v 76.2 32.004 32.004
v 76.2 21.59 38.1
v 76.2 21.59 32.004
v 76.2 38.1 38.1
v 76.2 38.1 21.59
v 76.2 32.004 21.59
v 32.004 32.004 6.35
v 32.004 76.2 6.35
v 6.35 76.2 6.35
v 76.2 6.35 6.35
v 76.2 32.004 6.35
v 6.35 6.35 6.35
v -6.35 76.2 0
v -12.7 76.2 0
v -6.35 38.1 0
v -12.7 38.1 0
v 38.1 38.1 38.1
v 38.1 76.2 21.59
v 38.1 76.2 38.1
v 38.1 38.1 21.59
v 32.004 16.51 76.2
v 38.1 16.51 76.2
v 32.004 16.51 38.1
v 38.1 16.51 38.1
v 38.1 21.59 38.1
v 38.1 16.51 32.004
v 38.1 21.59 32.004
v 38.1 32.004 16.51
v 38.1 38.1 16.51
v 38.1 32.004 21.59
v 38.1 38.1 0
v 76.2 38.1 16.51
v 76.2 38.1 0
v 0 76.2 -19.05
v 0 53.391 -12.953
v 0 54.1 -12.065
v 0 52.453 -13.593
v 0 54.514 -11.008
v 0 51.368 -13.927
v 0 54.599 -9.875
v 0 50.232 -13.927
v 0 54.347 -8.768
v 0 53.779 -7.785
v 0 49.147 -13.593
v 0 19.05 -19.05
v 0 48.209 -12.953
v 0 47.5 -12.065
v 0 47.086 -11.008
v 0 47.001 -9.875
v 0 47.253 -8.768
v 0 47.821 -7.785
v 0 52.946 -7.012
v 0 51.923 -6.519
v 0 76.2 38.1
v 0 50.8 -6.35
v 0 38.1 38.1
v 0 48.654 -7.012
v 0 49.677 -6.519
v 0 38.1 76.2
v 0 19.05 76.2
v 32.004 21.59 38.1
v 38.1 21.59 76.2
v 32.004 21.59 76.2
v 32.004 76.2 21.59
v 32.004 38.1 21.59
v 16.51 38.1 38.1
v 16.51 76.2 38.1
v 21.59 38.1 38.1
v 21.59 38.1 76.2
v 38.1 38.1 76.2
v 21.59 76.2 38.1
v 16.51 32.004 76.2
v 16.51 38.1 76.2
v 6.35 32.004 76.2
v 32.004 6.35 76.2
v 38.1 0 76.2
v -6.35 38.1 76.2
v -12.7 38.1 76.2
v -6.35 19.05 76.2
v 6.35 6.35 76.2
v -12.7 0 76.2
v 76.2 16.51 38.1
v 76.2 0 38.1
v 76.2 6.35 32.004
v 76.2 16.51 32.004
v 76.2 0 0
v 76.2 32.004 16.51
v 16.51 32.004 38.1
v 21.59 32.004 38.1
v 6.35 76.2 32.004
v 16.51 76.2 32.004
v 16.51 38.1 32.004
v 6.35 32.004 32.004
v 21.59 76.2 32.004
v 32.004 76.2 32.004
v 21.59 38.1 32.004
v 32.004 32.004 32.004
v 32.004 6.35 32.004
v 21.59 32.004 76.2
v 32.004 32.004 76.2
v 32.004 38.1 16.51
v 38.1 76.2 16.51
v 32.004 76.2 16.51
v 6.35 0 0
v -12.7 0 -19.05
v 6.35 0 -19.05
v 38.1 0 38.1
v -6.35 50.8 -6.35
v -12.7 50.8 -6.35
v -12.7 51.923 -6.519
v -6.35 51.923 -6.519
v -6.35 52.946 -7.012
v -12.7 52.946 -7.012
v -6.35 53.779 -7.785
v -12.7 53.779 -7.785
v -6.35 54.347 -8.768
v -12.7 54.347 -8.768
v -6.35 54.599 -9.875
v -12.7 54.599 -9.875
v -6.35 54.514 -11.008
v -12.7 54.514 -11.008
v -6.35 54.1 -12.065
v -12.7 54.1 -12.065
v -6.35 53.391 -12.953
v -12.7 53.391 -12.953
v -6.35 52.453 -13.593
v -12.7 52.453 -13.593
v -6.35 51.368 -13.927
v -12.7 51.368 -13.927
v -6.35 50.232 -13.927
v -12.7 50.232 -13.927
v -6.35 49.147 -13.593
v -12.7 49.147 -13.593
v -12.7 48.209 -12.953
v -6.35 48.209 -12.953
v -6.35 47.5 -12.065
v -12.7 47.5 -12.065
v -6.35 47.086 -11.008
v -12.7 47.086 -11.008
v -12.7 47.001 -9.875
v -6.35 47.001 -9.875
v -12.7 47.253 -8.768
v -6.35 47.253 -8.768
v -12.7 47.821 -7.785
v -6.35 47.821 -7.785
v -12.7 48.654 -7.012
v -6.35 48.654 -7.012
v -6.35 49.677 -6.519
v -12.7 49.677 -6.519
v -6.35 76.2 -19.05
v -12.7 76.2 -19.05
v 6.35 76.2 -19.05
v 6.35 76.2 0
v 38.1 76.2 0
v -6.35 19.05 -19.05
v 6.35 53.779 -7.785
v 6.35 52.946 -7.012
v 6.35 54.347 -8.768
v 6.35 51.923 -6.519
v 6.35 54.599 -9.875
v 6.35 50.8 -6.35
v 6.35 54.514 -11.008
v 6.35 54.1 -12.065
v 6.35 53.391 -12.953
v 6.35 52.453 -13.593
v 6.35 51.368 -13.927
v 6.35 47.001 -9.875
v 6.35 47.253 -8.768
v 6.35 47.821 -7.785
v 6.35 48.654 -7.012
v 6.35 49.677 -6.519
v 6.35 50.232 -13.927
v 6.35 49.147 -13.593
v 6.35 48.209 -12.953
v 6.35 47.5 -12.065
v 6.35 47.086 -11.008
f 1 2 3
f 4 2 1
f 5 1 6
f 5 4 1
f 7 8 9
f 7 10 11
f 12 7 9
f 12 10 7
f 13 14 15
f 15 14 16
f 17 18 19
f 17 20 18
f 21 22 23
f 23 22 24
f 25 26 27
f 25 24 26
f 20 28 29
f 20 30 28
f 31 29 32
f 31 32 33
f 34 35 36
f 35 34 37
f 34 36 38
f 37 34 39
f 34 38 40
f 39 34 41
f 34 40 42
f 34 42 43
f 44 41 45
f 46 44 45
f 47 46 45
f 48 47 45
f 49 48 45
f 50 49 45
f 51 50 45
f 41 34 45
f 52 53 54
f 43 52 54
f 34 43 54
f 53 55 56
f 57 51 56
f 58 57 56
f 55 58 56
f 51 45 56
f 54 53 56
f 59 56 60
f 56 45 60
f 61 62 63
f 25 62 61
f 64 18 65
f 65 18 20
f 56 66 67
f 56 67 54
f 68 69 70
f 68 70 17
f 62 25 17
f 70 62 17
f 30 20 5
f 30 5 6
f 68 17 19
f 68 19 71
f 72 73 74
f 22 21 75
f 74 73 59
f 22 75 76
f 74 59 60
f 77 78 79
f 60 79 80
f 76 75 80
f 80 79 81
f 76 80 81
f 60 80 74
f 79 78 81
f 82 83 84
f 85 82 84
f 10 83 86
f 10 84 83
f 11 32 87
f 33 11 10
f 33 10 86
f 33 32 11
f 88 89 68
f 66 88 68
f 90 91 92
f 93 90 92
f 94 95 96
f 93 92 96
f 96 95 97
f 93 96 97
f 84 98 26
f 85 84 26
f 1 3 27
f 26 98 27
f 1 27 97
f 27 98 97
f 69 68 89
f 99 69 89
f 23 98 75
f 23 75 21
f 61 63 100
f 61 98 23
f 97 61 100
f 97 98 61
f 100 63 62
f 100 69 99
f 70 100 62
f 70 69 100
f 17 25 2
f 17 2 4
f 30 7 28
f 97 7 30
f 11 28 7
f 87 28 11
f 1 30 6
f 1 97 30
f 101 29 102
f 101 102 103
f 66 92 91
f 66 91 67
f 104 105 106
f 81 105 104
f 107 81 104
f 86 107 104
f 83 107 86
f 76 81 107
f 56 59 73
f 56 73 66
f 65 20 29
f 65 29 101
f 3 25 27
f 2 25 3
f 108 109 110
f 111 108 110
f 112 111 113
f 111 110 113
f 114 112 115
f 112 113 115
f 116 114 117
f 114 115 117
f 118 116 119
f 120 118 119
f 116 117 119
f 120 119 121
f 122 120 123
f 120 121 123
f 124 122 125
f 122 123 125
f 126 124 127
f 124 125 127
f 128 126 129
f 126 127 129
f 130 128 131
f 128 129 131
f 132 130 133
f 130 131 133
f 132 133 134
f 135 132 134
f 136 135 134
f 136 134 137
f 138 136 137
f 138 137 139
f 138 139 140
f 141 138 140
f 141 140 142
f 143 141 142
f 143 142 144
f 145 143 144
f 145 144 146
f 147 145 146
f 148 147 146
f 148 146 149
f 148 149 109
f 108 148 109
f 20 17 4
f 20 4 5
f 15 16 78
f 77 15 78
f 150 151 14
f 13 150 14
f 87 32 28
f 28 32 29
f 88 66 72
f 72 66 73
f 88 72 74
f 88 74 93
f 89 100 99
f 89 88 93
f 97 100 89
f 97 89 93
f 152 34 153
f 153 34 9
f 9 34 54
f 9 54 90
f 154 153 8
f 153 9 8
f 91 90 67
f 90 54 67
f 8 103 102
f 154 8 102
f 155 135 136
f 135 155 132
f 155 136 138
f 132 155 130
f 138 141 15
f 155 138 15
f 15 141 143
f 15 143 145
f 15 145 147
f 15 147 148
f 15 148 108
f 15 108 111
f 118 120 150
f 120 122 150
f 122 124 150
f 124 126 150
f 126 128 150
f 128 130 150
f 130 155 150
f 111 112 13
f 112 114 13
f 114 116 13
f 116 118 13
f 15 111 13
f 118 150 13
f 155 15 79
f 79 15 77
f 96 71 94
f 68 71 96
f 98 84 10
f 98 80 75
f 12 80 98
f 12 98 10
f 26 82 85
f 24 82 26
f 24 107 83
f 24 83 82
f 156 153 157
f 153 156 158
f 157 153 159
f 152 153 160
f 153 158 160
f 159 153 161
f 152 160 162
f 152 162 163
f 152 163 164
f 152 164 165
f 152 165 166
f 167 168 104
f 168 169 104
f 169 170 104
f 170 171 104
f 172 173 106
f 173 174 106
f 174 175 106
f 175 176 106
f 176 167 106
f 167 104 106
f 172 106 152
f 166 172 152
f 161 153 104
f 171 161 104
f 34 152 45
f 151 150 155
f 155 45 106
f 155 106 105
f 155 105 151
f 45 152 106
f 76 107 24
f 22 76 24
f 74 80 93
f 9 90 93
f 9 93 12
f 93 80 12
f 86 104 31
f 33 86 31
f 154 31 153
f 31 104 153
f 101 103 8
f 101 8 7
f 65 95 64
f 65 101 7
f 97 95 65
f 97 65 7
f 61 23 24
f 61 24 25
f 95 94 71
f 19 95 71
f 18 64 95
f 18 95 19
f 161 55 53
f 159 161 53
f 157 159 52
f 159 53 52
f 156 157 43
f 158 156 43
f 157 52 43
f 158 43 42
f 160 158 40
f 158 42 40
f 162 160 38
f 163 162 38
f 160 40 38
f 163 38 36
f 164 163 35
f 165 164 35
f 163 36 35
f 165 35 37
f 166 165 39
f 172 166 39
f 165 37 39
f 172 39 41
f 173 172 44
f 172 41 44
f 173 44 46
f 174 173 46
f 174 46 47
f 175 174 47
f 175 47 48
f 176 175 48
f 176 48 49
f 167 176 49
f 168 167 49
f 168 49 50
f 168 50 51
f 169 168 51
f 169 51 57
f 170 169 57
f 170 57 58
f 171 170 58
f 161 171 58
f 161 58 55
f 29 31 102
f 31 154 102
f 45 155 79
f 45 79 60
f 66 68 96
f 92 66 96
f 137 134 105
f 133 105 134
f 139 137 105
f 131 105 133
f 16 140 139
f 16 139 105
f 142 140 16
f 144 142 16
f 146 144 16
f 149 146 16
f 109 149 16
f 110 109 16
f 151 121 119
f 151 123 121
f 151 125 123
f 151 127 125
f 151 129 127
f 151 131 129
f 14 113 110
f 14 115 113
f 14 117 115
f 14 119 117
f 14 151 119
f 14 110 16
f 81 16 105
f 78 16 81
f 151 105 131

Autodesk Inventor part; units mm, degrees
ref_plane "YZ Plane" through (0, 0, 0) normal (1, 0, 0) x (0, 1, 0)
ref_plane "XZ Plane" through (0, 0, 0) normal (0, 1, 0) x (-1, 0, 0)
ref_plane "XY Plane" through (0, 0, 0) normal (0, 0, 1) x (1, 0, 0)
sketch "Sketch1" plane through (0, 0, 0) normal (0, 0, 1) x (1, 0, 0)
  line L0 (0, 0) -> (38.1, 0)
  line L1 (38.1, 0) -> (38.1, 38.1)
  line L2 (38.1, 38.1) -> (0, 38.1)
  line L3 (0, 38.1) -> (0, 0)
  dimension "d0" = 38.1
  dimension "d1" = 38.1
extrude "Extrusion1" add sketch "Sketch1" along normal blind 38.1
sketch "Sketch2" plane through (0, 0, 38.1) normal (0, 0, 1) x (1, 0, 0)
  line L0 (6.35, 6.35) -> (32.004, 6.35)
  line L1 (32.004, 6.35) -> (32.004, 32.004)
  line L2 (32.004, 32.004) -> (6.35, 32.004)
  line L3 (6.35, 32.004) -> (6.35, 6.35)
  line L4 (38.1, 0) -> (38.1, 38.1) projected
  line L5 (0, 0) -> (38.1, 0)
  line L6 (38.1, 0) -> (38.1, 38.1)
  line L7 (38.1, 38.1) -> (0, 38.1)
  line L8 (0, 38.1) -> (0, 0)
  dimension "d4" = 25.654
  dimension "d5" = 25.654
extrude "Extrusion2" cut sketch "Sketch2" against normal blind 31.75 contours L3 L2 L1 L0
sketch "Sketch5" plane through (0, 0, 38.1) normal (0, 0, 1) x (1, 0, 0)
  line L0 (6.35, 6.35) -> (6.35, 32.004) projected
  line L1 (6.35, 6.35) -> (32.004, 6.35)
  line L2 (32.004, 6.35) -> (32.004, 32.004)
  line L3 (32.004, 32.004) -> (6.35, 32.004)
  line L4 (6.35, 32.004) -> (6.35, 6.35)
  line L5 (0, 0) -> (38.1, 0) projected
  line L6 (0, 0) -> (38.1, 0)
  line L7 (38.1, 0) -> (38.1, 38.1)
  line L8 (38.1, 38.1) -> (0, 38.1)
  line L9 (0, 38.1) -> (0, 0)
extrude "Extrusion4" add sketch "Sketch5" along normal blind 38.1
sketch "Sketch7" plane through (38.1, 0, 0) normal (1, 0, 0) x (0, 0, -1)
  line L0 (0, 0) -> (-76.2, 0) projected
  line L1 (0, 0) -> (-38.1, 0)
  line L2 (-38.1, 0) -> (-38.1, 38.1)
  line L3 (-38.1, 38.1) -> (0, 38.1)
  line L4 (0, 38.1) -> (0, 0)
  line L5 (-76.2, 6.35) -> (-6.35, 6.35) projected
  line L6 (-6.35, 6.35) -> (-32.004, 6.35)
  line L7 (-32.004, 6.35) -> (-32.004, 32.004)
  line L8 (-32.004, 32.004) -> (-6.35, 32.004)
  line L9 (-6.35, 32.004) -> (-6.35, 6.35)
  dimension "d16" = 38.1
  dimension "d17" = 38.1
  dimension "d20" = 25.654
  dimension "d21" = 25.654
extrude "Extrusion6" add sketch "Sketch7" along normal blind 38.1
sketch "Sketch9" plane through (38.1, 6.35, 6.35) normal (1, 0, 0) x (0, 0, -1)
  line L0 (-25.654, 0) -> (-25.654, 25.654) projected
  line L1 (0, 0) -> (0, 25.654) projected
  line L2 (-25.654, 0) -> (0, 0)
  line L3 (0, 0) -> (0, 25.654)
  line L4 (0, 25.654) -> (-25.654, 25.654)
  line L5 (-25.654, 25.654) -> (-25.654, 0)
  point P0 (6.35, -6.35)
extrude "Extrusion7" cut sketch "Sketch9" against normal blind 31.75
sketch "Sketch10" plane through (0, 38.1, 76.2) normal (0, 1, 0) x (1, 0, 0)
  line L0 (76.2, 69.85) -> (6.35, 69.85) projected
  line L1 (6.35, 69.85) -> (32.004, 69.85)
  line L2 (32.004, 69.85) -> (32.004, 44.196)
  line L3 (32.004, 44.196) -> (6.35, 44.196)
  line L4 (6.35, 44.196) -> (6.35, 69.85)
  line L5 (38.1, 38.1) -> (38.1, 0) projected
  line L6 (0, 76.2) -> (0, 0) projected
  line L7 (38.1, 38.1) -> (0, 38.1)
  line L8 (0, 38.1) -> (0, 76.2)
  line L9 (0, 76.2) -> (38.1, 76.2)
  line L10 (38.1, 76.2) -> (38.1, 38.1)
  point P0 (0, 38.1)
  dimension "d26" = 25.654
  dimension "d27" = 25.654
extrude "Extrusion8" add sketch "Sketch10" along normal blind 38.1
sketch "Sketch11" plane through (6.35, 38.1, 6.35) normal (0, 1, 0) x (1, 0, 0)
  line L0 (0, -25.654) -> (25.654, -25.654) projected
  line L1 (25.654, -25.654) -> (0, -25.654)
  line L2 (0, -25.654) -> (0, 0)
  line L3 (0, 0) -> (25.654, 0)
  line L4 (25.654, 0) -> (25.654, -25.654)
  point P0 (-6.35, 6.35)
extrude "Extrusion9" cut sketch "Sketch11" against normal blind 6.35
sketch "Sketch12" plane through (0, 76.2, 76.2) normal (0, 1, 0) x (1, 0, 0)
  line L0 (38.1, 55.88) -> (32.004, 55.88)
  line L1 (32.004, 55.88) -> (32.004, 58.42)
  line L2 (32.004, 58.42) -> (38.1, 58.42)
  line L3 (38.1, 58.42) -> (38.1, 55.88)
  point P0 (0, 76.2)
  dimension "d32" = 6.096
  dimension "d33" = 2.54
extrude "Extrusion10" cut sketch "Sketch12" against normal blind 38.1
sketch "Sketch13" plane through (76.2, 38.1, 38.1) normal (0, 1, 0) x (1, 0, 0)
  line L0 (0, 31.75) -> (0, 6.096) projected
  line L1 (-44.196, 17.78) -> (0, 17.78)
  line L2 (0, 17.78) -> (0, 20.32)
  line L3 (0, 20.32) -> (-44.196, 20.32)
  line L4 (-44.196, 20.32) -> (-44.196, 17.78)
  point P0 (-76.2, 38.1)
  dimension "d36" = 2.54
extrude "Extrusion11" cut sketch "Sketch13" against normal blind 6.35
sketch "Sketch15" plane through (0, 76.2, 76.2) normal (0, 1, 0) x (1, 0, 0)
  line L0 (17.78, 38.1) -> (20.32, 38.1)
  line L1 (20.32, 38.1) -> (20.32, 44.196)
  line L2 (20.32, 44.196) -> (17.78, 44.196)
  line L3 (17.78, 44.196) -> (17.78, 38.1)
  point P0 (0, 76.2)
  dimension "d39" = 2.54
  dimension "d40" = 6.096
extrude "Extrusion12" cut sketch "Sketch15" against normal blind 38.1
sketch "Sketch16" plane through (0, 38.1, 76.2) normal (0, 1, 0) x (1, 0, 0)
  line L0 (20.32, 44.196) -> (20.32, 38.1) projected
  line L1 (0, 0) -> (38.1, 0) projected
  line L2 (20.32, 44.196) -> (17.78, 44.196)
  line L3 (17.78, 44.196) -> (17.78, 0)
  line L4 (17.78, 0) -> (20.32, 0)
  line L5 (20.32, 0) -> (20.32, 44.196)
  point P0 (0, 76.2)
  dimension "d43" = 2.54
extrude "Extrusion13" cut sketch "Sketch16" against normal blind 6.35
sketch "Sketch17" plane through (38.1, 0, 76.2) normal (1, 0, 0) x (0, 0, -1)
  line L0 (38.1, 0) -> (38.1, 38.1) projected
  line L1 (0, 17.78) -> (38.1, 17.78)
  line L2 (38.1, 17.78) -> (38.1, 20.32)
  line L3 (38.1, 20.32) -> (0, 20.32)
  line L4 (0, 20.32) -> (0, 17.78)
  point P0 (76.2, 0)
  dimension "d46" = 2.54
extrude "Extrusion14" cut sketch "Sketch17" against normal blind 6.35
sketch "Sketch18" plane through (38.1, 0, 38.1) normal (0, 0, 1) x (1, 0, 0)
  line L0 (0, 17.78) -> (38.1, 17.78)
  line L1 (38.1, 17.78) -> (38.1, 20.32)
  line L2 (38.1, 20.32) -> (0, 20.32)
  line L3 (0, 20.32) -> (0, 17.78)
  point P0 (-38.1, 0)
  dimension "d49" = 38.1
  dimension "d50" = 2.54
extrude "Extrusion15" cut sketch "Sketch18" against normal blind 6.35
sketch "Sketch20" plane through (38.1, 38.1, 38.1) normal (0, 0, 1) x (1, 0, 0)
  line L0 (-17.78, -6.096) -> (-17.78, 38.1) projected
  line L1 (0, 0) -> (-17.78, 0) projected
  line L2 (-17.78, 38.1) -> (-16.51, 38.1)
  line L3 (-16.51, 38.1) -> (-16.51, 0)
  line L4 (-16.51, 0) -> (-17.78, 0)
  line L5 (-17.78, 0) -> (-17.78, 38.1)
  point P0 (-38.1, -38.1)
  dimension "d53" = 1.27
extrude "Extrusion16" cut sketch "Sketch20" against normal blind 6.35
sketch "Sketch21" plane through (38.1, 38.1, 76.2) normal (0, 1, 0) x (1, 0, 0)
  line L0 (-17.78, 0) -> (-17.78, 44.196) projected
  line L1 (0, 0) -> (-17.78, 0) projected
  line L2 (-17.78, 44.196) -> (-16.51, 44.196)
  line L3 (-16.51, 44.196) -> (-16.51, 0)
  line L4 (-16.51, 0) -> (-17.78, 0)
  line L5 (-17.78, 0) -> (-17.78, 44.196)
  point P0 (-38.1, 76.2)
  dimension "d56" = 1.27
extrude "Extrusion17" cut sketch "Sketch21" against normal blind 6.35
sketch "Sketch23" plane through (0, 38.1, 38.1) normal (0, 0, 1) x (1, 0, 0)
  line L0 (17.78, 0) -> (17.78, 38.1) projected
  line L1 (17.78, 0) -> (0, 0) projected
  line L2 (17.78, 38.1) -> (16.51, 38.1)
  line L3 (16.51, 38.1) -> (16.51, 0)
  line L4 (16.51, 0) -> (17.78, 0)
  line L5 (17.78, 0) -> (17.78, 38.1)
  point P0 (0, -38.1)
  dimension "d59" = 1.27
extrude "Extrusion18" cut sketch "Sketch23" against normal blind 6.35
sketch "Sketch24" plane through (0, 38.1, 76.2) normal (0, 1, 0) x (1, 0, 0)
  line L0 (17.78, 44.196) -> (17.78, 0) projected
  line L1 (17.78, 0) -> (0, 0) projected
  line L2 (17.78, 44.196) -> (16.51, 44.196)
  line L3 (16.51, 44.196) -> (16.51, 0)
  line L4 (16.51, 0) -> (17.78, 0)
  line L5 (17.78, 0) -> (17.78, 44.196)
  point P0 (0, 76.2)
  dimension "d62" = 1.27
extrude "Extrusion19" cut sketch "Sketch24" against normal blind 6.35
sketch "Sketch25" plane through (38.1, 0, 76.2) normal (1, 0, 0) x (0, 0, -1)
  line L0 (38.1, 0) -> (38.1, 17.78) projected
  line L1 (38.1, 17.78) -> (0, 17.78)
  line L2 (0, 17.78) -> (0, 16.51)
  line L3 (0, 16.51) -> (38.1, 16.51)
  line L4 (38.1, 16.51) -> (38.1, 17.78)
  point P0 (76.2, 0)
  dimension "d65" = 38.1
  dimension "d66" = 1.27
extrude "Extrusion20" cut sketch "Sketch25" against normal blind 6.35
sketch "Sketch26" plane through (38.1, 38.1, 76.2) normal (1, 0, 0) x (0, 0, -1)
  line L0 (0, -17.78) -> (38.1, -17.78) projected
  line L1 (38.1, -17.78) -> (0, -17.78)
  line L2 (0, -17.78) -> (0, -16.51)
  line L3 (0, -16.51) -> (38.1, -16.51)
  line L4 (38.1, -16.51) -> (38.1, -17.78)
  point P0 (76.2, -38.1)
  dimension "d69" = 38.1
  dimension "d70" = 1.27
extrude "Extrusion21" cut sketch "Sketch26" against normal blind 6.35
sketch "Sketch27" plane through (38.1, 0, 38.1) normal (0, 0, 1) x (1, 0, 0)
  line L0 (0, 21.59) -> (0, 38.1) projected
  line L1 (0, 20.32) -> (38.1, 20.32) projected
  line L2 (0, 21.59) -> (38.1, 21.59)
  line L3 (38.1, 21.59) -> (38.1, 20.32)
  line L4 (38.1, 20.32) -> (0, 20.32)
  line L5 (0, 20.32) -> (0, 21.59)
  line L6 (38.1, 17.78) -> (0, 17.78) projected
  line L7 (0, 17.78) -> (38.1, 17.78)
  line L8 (38.1, 17.78) -> (38.1, 16.51)
  line L9 (38.1, 16.51) -> (0, 16.51)
  line L10 (0, 16.51) -> (0, 17.78)
  point P0 (-38.1, 0)
  dimension "d73" = 38.1
  dimension "d74" = 1.27
extrude "Extrusion22" cut sketch "Sketch27" against normal blind 6.35
sketch "Sketch28" plane through (38.1, 38.1, 38.1) normal (0, 1, 0) x (1, 0, 0)
  line L0 (0, 20.32) -> (38.1, 20.32) projected
  line L1 (0, 20.32) -> (38.1, 20.32)
  line L2 (38.1, 20.32) -> (38.1, 21.59)
  line L3 (38.1, 21.59) -> (0, 21.59)
  line L4 (0, 21.59) -> (0, 20.32)
  line L5 (-6.096, 17.78) -> (38.1, 17.78) projected
  line L6 (38.1, 17.78) -> (0, 17.78)
  line L7 (0, 17.78) -> (0, 16.51)
  line L8 (0, 16.51) -> (38.1, 16.51)
  line L9 (38.1, 16.51) -> (38.1, 17.78)
  point P0 (-38.1, 38.1)
  point P1 (0, 17.78)
  dimension "d77" = 38.1
  dimension "d78" = 1.27
  dimension "d79" = 38.1
  dimension "d80" = 1.27
extrude "Extrusion23" cut sketch "Sketch28" against normal blind 6.35
sketch "Sketch29" plane through (38.1, 38.1, 0) normal (1, 0, 0) x (0, 0, -1)
  line L0 (-17.78, -6.096) -> (-6.35, -6.096) projected
  line L1 (-6.35, 38.1) -> (-17.78, 38.1) projected
  line L2 (-17.78, -6.096) -> (-16.51, -6.096)
  line L3 (-16.51, -6.096) -> (-16.51, 38.1)
  line L4 (-16.51, 38.1) -> (-17.78, 38.1)
  line L5 (-17.78, 38.1) -> (-17.78, -6.096)
  line L6 (-21.59, 0) -> (-21.59, -6.096) projected
  line L7 (-20.32, 38.1) -> (-20.32, -6.096) projected
  line L8 (-21.59, -6.096) -> (-20.32, -6.096)
  line L9 (-20.32, -6.096) -> (-20.32, 38.1)
  line L10 (-20.32, 38.1) -> (-21.59, 38.1)
  line L11 (-21.59, 38.1) -> (-21.59, -6.096)
  point P0 (0, -38.1)
  point P1 (-20.32, -6.096)
  dimension "d83" = 1.27
extrude "Extrusion24" cut sketch "Sketch29" against normal blind 6.35
sketch "Sketch30" plane through (76.2, 38.1, 21.59) normal (0, 0, -1) x (-1, 0, 0)
  line L0 (0, 0) -> (38.1, 0) projected
  line L1 (44.196, 38.1) -> (44.196, -6.096) projected
  line L2 (38.1, 0) -> (44.196, 0)
  line L3 (44.196, 0) -> (44.196, -6.096)
  line L4 (44.196, -6.096) -> (38.1, -6.096)
  line L5 (38.1, -6.096) -> (38.1, 0)
  point P0 (76.2, -38.1)
  point P1 (44.196, 0)
extrude "Extrusion25" add sketch "Sketch30" along normal blind 5.08
sketch "Sketch31" plane through (21.59, 38.1, 38.1) normal (-1, 0, 0) x (0, 0, 1)
  line L0 (38.1, -6.096) -> (-6.096, -6.096) projected
  line L1 (0, 0) -> (-6.096, 0)
  line L2 (-6.096, 0) -> (-6.096, -6.096)
  line L3 (-6.096, -6.096) -> (0, -6.096)
  line L4 (0, -6.096) -> (0, 0)
  point P0 (-38.1, -38.1)
extrude "Extrusion26" add sketch "Sketch31" along normal blind 5.08
sketch "Sketch32" plane through (0, 0, 76.2) normal (-1, 0, 0) x (0, 0, 1)
  line L0 (0, 38.1) -> (0, 0) projected
  line L1 (0, 19.05) -> (-76.2, 19.05)
  line L2 (-76.2, 19.05) -> (-76.2, 0)
  line L3 (-76.2, 0) -> (0, 0)
  line L4 (0, 0) -> (0, 19.05)
  line L5 (-76.2, 0) -> (-56.896, 0)
  line L6 (-56.896, 0) -> (-56.896, 76.2)
  line L7 (-56.896, 76.2) -> (-76.2, 76.2)
  line L8 (-76.2, 76.2) -> (-76.2, 0)
  point P0 (0, 0)
  point P1 (-56.896, 19.05)
  dimension "d90" = 19.304
  dimension "d91" = 76.2
extrude "Extrusion27" add sketch "Sketch32" along normal blind 12.7 contours L0 L3 L6 L1 | L6 L3 L2 L1
sketch "Sketch34" plane through (-12.7, 0, 76.2) normal (-1, 0, 0) x (0, 0, 1)
  line L0 (0, 38.1) -> (0, 19.05) projected
  line L1 (0, 19.05) -> (-76.2, 19.05)
  line L2 (-76.2, 19.05) -> (-76.2, 38.1)
  line L3 (-76.2, 38.1) -> (0, 38.1)
  line L4 (0, 38.1) -> (0, 19.05)
  point P0 (-76.2, 0)
  dimension "d98" = 76.2
  dimension "d99" = 19.05
extrude "Extrusion29" add sketch "Sketch34" against normal blind 6.35
sketch "Sketch35" plane through (-12.7, 0, 76.2) normal (-1, 0, 0) x (0, 0, 1)
  line L0 (-76.2, 0) -> (-95.25, 0)
  line L1 (-95.25, 0) -> (-95.25, 76.2)
  line L2 (-95.25, 76.2) -> (-76.2, 76.2)
  line L3 (-76.2, 76.2) -> (-76.2, 0)
  dimension "d102" = 19.05
  dimension "d103" = 76.2
extrude "Extrusion30" add sketch "Sketch35" against normal blind 6.35
sketch "Sketch37" plane through (0, 19.05, 76.2) normal (0, 1, 0) x (1, 0, 0)
  line L0 (0, 76.2) -> (-6.35, 76.2)
  line L1 (-6.35, 76.2) -> (-6.35, 95.25)
  line L2 (-6.35, 95.25) -> (0, 95.25)
  line L3 (0, 95.25) -> (0, 76.2)
  dimension "d106" = 6.35
  dimension "d107" = 19.05
extrude "Extrusion31" add sketch "Sketch37" against normal blind 19.05
sketch "Sketch38" plane through (38.1, 0, 38.1) normal (0, -1, 0) x (1, 0, 0)
  line L0 (-38.1, -38.1) -> (-31.75, -38.1)
  line L1 (-31.75, -38.1) -> (-31.75, -57.15)
  line L2 (-31.75, -57.15) -> (-38.1, -57.15)
  line L3 (-38.1, -57.15) -> (-38.1, -38.1)
  dimension "d110" = 6.35
  dimension "d111" = 19.05
extrude "Extrusion32" add sketch "Sketch38" against normal blind 76.2
sketch "Sketch39" plane through (-12.7, 0, 76.2) normal (-1, 0, 0) x (0, 0, 1)
  circle A0 centre (-86.36, 50.8) radius 3.81
  point P0 (-76.2, 0)
  dimension "d114" = 7.62
extrude "Extrusion33" cut sketch "Sketch39" against normal through all
properties part number "corner connector with rails (front right)"
